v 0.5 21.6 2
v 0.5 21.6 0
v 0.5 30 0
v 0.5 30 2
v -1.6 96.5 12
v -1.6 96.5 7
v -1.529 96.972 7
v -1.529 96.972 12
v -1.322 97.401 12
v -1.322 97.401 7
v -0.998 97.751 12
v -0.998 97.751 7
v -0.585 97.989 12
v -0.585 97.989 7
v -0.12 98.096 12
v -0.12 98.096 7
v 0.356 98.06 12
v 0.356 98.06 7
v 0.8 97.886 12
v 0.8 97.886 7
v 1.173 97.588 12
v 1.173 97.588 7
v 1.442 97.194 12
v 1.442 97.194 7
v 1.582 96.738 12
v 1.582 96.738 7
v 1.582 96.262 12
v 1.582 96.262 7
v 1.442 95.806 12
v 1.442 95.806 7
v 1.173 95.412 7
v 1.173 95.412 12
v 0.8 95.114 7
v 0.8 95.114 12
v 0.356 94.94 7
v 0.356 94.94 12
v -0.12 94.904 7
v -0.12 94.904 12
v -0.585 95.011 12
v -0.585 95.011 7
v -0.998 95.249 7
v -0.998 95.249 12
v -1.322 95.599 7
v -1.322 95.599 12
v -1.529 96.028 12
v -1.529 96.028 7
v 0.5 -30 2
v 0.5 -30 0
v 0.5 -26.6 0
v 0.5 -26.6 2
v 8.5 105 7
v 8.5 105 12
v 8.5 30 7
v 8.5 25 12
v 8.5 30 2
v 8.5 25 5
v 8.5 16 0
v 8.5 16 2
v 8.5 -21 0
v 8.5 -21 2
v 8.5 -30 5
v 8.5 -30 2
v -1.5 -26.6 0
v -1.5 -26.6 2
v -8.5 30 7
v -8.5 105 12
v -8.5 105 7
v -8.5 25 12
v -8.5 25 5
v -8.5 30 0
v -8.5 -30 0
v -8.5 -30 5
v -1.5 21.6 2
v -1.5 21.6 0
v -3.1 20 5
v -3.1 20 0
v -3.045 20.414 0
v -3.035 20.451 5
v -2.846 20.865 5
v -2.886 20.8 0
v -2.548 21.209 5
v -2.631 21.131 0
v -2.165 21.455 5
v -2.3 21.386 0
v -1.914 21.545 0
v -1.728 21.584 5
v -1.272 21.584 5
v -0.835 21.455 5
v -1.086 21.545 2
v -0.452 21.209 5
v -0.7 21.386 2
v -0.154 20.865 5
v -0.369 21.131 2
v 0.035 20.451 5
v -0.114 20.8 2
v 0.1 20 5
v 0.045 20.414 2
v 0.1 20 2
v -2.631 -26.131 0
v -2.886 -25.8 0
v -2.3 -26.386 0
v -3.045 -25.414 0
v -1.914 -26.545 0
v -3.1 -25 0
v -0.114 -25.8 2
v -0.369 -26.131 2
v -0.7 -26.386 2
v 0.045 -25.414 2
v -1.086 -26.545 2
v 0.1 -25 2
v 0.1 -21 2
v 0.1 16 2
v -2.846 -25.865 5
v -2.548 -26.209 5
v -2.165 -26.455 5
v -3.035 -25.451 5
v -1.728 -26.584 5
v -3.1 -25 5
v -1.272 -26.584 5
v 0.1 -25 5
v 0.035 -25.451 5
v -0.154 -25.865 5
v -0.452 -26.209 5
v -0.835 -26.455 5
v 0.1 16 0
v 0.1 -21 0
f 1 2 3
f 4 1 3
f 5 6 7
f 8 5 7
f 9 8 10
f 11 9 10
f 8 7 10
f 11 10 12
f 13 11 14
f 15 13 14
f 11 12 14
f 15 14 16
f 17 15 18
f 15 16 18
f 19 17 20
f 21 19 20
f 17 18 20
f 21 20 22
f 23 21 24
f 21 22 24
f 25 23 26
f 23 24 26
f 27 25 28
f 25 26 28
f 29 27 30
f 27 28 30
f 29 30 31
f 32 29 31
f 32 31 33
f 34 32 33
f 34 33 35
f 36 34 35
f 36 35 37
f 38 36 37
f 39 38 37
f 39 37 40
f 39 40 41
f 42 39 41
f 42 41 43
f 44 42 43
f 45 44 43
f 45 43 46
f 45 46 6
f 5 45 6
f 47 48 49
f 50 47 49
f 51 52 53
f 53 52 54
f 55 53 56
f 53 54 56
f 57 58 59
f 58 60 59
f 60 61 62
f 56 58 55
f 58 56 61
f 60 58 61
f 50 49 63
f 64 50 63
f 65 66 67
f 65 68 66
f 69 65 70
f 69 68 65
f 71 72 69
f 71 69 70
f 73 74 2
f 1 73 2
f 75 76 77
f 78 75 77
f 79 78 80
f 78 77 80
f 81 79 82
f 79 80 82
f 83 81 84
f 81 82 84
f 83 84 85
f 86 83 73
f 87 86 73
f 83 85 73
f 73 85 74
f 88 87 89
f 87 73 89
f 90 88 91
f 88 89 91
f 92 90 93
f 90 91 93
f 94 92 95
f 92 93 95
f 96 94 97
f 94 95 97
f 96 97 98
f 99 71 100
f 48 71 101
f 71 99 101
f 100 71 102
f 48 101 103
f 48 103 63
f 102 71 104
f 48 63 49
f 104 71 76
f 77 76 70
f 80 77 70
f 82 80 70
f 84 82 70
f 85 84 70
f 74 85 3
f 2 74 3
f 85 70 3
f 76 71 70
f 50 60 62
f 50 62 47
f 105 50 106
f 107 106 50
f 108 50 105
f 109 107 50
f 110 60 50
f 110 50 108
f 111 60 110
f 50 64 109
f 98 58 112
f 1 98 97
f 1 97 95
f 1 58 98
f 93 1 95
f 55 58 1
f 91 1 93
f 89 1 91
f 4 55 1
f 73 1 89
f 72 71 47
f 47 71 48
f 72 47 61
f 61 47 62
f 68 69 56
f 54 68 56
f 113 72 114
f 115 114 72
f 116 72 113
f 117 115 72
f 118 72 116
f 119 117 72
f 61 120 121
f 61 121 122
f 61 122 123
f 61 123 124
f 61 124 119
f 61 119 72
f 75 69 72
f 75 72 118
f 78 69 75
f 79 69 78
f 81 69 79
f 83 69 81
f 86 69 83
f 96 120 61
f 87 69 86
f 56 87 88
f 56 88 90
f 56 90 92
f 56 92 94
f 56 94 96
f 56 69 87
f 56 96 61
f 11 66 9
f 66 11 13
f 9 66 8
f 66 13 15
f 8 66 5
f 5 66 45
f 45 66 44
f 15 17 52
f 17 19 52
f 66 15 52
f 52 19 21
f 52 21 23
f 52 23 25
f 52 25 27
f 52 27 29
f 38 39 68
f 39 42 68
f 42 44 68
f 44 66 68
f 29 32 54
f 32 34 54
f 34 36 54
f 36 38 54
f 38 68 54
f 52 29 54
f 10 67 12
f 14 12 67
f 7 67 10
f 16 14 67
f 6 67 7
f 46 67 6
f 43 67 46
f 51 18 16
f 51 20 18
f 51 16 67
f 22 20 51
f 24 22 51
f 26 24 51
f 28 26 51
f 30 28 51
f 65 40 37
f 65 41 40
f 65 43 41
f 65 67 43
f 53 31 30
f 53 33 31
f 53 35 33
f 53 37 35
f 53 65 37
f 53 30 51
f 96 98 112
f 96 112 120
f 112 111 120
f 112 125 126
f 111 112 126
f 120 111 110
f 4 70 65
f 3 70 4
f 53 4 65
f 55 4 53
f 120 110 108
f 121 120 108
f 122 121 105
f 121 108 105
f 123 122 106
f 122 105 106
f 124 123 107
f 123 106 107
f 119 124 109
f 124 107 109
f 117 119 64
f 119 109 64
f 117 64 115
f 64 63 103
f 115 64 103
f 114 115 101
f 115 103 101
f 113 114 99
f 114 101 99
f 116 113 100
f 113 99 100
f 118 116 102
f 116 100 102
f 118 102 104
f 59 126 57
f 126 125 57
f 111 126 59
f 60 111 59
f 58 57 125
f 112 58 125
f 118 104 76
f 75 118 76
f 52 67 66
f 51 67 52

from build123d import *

# Parameters (mm, degrees)
SKETCH1_W           = 17
SKETCH1_H           = 60
BOSS_EXTRUDE1_DEPTH = 5
SKETCH2_W           = 17
SKETCH2_H           = 5
BOSS_EXTRUDE2_DEPTH = 7
SKETCH3_W           = 17
SKETCH3_H           = 5
BOSS_EXTRUDE3_DEPTH = 75
SKETCH4_R           = 1.6
CUT_EXTRUDE1_DEPTH  = 106.575802152
CUT_EXTRUDE2_DEPTH  = 2


with BuildPart() as part:
    # Sketch1 → Boss-Extrude1 (new body)
    with BuildSketch(Plane.XY):
        Rectangle(SKETCH1_W, SKETCH1_H)
        with BuildLine():
            Line((0.1, 20), (0.1, -25))
            ThreePointArc((0.1, -25), (-1.5, -26.6), (-3.1, -25))
            Line((-3.1, -25), (-3.1, 20))
            ThreePointArc((-3.1, 20), (-1.5, 21.6), (0.1, 20))
        make_face(mode=Mode.SUBTRACT)
    extrude(amount=BOSS_EXTRUDE1_DEPTH)

    # Sketch2 → Boss-Extrude2 (add)
    with BuildSketch(Plane.XY.offset(5)):
        with Locations((0, 27.5)):
            Rectangle(SKETCH2_W, SKETCH2_H)
    extrude(amount=BOSS_EXTRUDE2_DEPTH)

    # Sketch3 → Boss-Extrude3 (add)
    with BuildSketch(Plane(origin=(0, 30, 0), x_dir=(1, 0, 0), z_dir=(0, 1, 0))):
        with Locations((0, -9.5)):
            Rectangle(SKETCH3_W, SKETCH3_H)
    extrude(amount=BOSS_EXTRUDE3_DEPTH)

    # Sketch4 → Cut-Extrude1 (cut, through all)
    with BuildSketch(Plane(origin=(0, 0, 7), x_dir=(-1, 0, 0), z_dir=(0, 0, -1))):
        with Locations((0, 96.5)):
            Circle(SKETCH4_R)
    extrude(amount=-CUT_EXTRUDE1_DEPTH, mode=Mode.SUBTRACT)

    # Sketch5 → Cut-Extrude2 (cut)
    with BuildSketch(Plane(origin=(0, 0, 0), x_dir=(-1, 0, 0), z_dir=(0, 0, -1))):
        Polygon((-0.5, 21.6), (-0.5, 30), (-8.5, 30), (-8.5, 16), (-0.5, 16), align=None)
        with BuildLine():
            Line((1.5, 21.6), (-0.5, 21.6))
            Line((-0.5, 21.6), (-0.5, 16))
            Line((-0.5, 16), (-0.1, 16))
            Line((-0.1, 16), (-0.1, 20))
            ThreePointArc((-0.1, 20), (0.36862915, 21.13137085), (1.5, 21.6))
        make_face()
        Polygon((-0.5, -21), (-8.5, -21), (-8.5, -30), (-0.5, -30), (-0.5, -26.6), align=None)
        with BuildLine():
            Line((-0.1, -21), (-0.5, -21))
            Line((-0.5, -21), (-0.5, -26.6))
            Line((-0.5, -26.6), (1.5, -26.6))
            ThreePointArc((1.5, -26.6), (0.36862915, -26.13137085), (-0.1, -25))
            Line((-0.1, -25), (-0.1, -21))
        make_face()
    extrude(amount=-CUT_EXTRUDE2_DEPTH, mode=Mode.SUBTRACT)


solid = part.part
